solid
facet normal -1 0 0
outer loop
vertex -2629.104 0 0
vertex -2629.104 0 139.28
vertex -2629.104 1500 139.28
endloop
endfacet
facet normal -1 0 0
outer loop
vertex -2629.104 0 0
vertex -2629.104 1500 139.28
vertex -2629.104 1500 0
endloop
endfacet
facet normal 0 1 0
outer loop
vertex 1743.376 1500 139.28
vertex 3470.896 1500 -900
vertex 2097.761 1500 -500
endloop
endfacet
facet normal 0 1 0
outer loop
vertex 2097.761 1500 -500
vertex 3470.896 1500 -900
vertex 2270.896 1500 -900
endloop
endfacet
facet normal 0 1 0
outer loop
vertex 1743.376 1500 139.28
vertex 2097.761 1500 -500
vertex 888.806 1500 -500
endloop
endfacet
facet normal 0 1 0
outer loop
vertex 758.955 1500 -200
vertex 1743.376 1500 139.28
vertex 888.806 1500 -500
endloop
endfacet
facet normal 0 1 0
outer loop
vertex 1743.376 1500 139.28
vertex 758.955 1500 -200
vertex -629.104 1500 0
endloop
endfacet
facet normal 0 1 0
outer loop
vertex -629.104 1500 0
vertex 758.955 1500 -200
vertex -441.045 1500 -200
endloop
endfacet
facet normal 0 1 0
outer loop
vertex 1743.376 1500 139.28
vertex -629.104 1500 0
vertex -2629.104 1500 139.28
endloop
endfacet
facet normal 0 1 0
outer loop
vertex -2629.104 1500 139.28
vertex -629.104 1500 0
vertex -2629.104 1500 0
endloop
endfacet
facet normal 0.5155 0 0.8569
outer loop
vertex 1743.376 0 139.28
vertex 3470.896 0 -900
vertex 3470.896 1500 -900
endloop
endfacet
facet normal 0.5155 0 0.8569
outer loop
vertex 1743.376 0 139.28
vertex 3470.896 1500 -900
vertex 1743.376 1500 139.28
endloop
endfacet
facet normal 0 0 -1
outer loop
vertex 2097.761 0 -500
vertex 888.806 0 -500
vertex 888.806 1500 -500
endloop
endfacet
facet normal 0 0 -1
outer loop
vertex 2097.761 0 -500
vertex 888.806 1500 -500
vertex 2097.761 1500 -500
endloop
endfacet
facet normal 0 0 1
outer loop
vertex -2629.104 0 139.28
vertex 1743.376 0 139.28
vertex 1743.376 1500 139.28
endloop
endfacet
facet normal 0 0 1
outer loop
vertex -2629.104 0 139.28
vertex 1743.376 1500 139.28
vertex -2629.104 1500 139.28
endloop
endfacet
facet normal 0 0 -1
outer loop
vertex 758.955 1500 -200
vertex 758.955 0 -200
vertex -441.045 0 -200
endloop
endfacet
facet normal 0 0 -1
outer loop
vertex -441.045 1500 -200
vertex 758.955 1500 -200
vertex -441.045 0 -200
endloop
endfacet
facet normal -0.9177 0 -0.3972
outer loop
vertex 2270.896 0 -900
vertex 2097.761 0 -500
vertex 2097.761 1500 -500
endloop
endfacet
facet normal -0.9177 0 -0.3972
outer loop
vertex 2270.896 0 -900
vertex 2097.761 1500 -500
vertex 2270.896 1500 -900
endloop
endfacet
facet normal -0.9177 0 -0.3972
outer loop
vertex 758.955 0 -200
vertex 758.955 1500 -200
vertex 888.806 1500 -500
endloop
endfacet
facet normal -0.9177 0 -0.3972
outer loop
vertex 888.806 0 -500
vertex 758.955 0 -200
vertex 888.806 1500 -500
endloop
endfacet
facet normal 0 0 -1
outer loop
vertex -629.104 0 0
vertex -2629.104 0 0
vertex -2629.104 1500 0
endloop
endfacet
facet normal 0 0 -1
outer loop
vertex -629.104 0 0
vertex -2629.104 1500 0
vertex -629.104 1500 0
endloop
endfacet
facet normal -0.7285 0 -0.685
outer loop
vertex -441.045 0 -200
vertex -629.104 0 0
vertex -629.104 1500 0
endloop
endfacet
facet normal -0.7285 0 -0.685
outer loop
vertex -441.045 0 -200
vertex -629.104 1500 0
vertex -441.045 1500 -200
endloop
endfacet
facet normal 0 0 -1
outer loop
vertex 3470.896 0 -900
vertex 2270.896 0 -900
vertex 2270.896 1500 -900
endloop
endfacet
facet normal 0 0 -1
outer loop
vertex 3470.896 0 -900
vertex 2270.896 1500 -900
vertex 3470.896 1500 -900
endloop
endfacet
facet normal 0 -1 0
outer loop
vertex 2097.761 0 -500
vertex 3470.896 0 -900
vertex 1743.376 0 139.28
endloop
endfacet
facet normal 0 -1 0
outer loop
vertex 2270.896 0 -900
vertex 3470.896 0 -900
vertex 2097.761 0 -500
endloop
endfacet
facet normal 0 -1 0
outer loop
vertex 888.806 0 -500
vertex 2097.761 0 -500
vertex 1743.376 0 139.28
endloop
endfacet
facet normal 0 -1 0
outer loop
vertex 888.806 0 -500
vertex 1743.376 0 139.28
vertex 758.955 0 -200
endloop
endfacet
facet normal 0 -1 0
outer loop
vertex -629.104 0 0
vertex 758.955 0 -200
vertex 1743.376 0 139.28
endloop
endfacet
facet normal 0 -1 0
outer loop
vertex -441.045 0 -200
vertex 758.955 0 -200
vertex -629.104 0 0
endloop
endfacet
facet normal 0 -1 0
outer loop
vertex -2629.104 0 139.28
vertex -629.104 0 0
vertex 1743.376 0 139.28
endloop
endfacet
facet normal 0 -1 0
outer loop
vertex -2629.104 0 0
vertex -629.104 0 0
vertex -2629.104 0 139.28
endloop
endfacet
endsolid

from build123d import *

# Parameters (mm, degrees)
BOSS_EXTRUDE1_DEPTH = 1500


with BuildPart() as part:
    # Sketch1 → Boss-Extrude1 (new body)
    with BuildSketch(Plane(origin=(0, 0, 0), x_dir=(1, 0, 0), z_dir=(0, 1, 0))):
        Polygon((-2629.104477612, 0), (-629.104477612, 0), (-441.044776119, 200), (29.104477612, 200), (758.955223881, 200), (888.805970149, 500), (2097.76119403, 500), (2270.895522388, 900), (3470.895522388, 900), (1743.375754441, -139.280385584), (-2629.104477612, -139.280385584), align=None)
    extrude(amount=BOSS_EXTRUDE1_DEPTH)


solid = part.part
